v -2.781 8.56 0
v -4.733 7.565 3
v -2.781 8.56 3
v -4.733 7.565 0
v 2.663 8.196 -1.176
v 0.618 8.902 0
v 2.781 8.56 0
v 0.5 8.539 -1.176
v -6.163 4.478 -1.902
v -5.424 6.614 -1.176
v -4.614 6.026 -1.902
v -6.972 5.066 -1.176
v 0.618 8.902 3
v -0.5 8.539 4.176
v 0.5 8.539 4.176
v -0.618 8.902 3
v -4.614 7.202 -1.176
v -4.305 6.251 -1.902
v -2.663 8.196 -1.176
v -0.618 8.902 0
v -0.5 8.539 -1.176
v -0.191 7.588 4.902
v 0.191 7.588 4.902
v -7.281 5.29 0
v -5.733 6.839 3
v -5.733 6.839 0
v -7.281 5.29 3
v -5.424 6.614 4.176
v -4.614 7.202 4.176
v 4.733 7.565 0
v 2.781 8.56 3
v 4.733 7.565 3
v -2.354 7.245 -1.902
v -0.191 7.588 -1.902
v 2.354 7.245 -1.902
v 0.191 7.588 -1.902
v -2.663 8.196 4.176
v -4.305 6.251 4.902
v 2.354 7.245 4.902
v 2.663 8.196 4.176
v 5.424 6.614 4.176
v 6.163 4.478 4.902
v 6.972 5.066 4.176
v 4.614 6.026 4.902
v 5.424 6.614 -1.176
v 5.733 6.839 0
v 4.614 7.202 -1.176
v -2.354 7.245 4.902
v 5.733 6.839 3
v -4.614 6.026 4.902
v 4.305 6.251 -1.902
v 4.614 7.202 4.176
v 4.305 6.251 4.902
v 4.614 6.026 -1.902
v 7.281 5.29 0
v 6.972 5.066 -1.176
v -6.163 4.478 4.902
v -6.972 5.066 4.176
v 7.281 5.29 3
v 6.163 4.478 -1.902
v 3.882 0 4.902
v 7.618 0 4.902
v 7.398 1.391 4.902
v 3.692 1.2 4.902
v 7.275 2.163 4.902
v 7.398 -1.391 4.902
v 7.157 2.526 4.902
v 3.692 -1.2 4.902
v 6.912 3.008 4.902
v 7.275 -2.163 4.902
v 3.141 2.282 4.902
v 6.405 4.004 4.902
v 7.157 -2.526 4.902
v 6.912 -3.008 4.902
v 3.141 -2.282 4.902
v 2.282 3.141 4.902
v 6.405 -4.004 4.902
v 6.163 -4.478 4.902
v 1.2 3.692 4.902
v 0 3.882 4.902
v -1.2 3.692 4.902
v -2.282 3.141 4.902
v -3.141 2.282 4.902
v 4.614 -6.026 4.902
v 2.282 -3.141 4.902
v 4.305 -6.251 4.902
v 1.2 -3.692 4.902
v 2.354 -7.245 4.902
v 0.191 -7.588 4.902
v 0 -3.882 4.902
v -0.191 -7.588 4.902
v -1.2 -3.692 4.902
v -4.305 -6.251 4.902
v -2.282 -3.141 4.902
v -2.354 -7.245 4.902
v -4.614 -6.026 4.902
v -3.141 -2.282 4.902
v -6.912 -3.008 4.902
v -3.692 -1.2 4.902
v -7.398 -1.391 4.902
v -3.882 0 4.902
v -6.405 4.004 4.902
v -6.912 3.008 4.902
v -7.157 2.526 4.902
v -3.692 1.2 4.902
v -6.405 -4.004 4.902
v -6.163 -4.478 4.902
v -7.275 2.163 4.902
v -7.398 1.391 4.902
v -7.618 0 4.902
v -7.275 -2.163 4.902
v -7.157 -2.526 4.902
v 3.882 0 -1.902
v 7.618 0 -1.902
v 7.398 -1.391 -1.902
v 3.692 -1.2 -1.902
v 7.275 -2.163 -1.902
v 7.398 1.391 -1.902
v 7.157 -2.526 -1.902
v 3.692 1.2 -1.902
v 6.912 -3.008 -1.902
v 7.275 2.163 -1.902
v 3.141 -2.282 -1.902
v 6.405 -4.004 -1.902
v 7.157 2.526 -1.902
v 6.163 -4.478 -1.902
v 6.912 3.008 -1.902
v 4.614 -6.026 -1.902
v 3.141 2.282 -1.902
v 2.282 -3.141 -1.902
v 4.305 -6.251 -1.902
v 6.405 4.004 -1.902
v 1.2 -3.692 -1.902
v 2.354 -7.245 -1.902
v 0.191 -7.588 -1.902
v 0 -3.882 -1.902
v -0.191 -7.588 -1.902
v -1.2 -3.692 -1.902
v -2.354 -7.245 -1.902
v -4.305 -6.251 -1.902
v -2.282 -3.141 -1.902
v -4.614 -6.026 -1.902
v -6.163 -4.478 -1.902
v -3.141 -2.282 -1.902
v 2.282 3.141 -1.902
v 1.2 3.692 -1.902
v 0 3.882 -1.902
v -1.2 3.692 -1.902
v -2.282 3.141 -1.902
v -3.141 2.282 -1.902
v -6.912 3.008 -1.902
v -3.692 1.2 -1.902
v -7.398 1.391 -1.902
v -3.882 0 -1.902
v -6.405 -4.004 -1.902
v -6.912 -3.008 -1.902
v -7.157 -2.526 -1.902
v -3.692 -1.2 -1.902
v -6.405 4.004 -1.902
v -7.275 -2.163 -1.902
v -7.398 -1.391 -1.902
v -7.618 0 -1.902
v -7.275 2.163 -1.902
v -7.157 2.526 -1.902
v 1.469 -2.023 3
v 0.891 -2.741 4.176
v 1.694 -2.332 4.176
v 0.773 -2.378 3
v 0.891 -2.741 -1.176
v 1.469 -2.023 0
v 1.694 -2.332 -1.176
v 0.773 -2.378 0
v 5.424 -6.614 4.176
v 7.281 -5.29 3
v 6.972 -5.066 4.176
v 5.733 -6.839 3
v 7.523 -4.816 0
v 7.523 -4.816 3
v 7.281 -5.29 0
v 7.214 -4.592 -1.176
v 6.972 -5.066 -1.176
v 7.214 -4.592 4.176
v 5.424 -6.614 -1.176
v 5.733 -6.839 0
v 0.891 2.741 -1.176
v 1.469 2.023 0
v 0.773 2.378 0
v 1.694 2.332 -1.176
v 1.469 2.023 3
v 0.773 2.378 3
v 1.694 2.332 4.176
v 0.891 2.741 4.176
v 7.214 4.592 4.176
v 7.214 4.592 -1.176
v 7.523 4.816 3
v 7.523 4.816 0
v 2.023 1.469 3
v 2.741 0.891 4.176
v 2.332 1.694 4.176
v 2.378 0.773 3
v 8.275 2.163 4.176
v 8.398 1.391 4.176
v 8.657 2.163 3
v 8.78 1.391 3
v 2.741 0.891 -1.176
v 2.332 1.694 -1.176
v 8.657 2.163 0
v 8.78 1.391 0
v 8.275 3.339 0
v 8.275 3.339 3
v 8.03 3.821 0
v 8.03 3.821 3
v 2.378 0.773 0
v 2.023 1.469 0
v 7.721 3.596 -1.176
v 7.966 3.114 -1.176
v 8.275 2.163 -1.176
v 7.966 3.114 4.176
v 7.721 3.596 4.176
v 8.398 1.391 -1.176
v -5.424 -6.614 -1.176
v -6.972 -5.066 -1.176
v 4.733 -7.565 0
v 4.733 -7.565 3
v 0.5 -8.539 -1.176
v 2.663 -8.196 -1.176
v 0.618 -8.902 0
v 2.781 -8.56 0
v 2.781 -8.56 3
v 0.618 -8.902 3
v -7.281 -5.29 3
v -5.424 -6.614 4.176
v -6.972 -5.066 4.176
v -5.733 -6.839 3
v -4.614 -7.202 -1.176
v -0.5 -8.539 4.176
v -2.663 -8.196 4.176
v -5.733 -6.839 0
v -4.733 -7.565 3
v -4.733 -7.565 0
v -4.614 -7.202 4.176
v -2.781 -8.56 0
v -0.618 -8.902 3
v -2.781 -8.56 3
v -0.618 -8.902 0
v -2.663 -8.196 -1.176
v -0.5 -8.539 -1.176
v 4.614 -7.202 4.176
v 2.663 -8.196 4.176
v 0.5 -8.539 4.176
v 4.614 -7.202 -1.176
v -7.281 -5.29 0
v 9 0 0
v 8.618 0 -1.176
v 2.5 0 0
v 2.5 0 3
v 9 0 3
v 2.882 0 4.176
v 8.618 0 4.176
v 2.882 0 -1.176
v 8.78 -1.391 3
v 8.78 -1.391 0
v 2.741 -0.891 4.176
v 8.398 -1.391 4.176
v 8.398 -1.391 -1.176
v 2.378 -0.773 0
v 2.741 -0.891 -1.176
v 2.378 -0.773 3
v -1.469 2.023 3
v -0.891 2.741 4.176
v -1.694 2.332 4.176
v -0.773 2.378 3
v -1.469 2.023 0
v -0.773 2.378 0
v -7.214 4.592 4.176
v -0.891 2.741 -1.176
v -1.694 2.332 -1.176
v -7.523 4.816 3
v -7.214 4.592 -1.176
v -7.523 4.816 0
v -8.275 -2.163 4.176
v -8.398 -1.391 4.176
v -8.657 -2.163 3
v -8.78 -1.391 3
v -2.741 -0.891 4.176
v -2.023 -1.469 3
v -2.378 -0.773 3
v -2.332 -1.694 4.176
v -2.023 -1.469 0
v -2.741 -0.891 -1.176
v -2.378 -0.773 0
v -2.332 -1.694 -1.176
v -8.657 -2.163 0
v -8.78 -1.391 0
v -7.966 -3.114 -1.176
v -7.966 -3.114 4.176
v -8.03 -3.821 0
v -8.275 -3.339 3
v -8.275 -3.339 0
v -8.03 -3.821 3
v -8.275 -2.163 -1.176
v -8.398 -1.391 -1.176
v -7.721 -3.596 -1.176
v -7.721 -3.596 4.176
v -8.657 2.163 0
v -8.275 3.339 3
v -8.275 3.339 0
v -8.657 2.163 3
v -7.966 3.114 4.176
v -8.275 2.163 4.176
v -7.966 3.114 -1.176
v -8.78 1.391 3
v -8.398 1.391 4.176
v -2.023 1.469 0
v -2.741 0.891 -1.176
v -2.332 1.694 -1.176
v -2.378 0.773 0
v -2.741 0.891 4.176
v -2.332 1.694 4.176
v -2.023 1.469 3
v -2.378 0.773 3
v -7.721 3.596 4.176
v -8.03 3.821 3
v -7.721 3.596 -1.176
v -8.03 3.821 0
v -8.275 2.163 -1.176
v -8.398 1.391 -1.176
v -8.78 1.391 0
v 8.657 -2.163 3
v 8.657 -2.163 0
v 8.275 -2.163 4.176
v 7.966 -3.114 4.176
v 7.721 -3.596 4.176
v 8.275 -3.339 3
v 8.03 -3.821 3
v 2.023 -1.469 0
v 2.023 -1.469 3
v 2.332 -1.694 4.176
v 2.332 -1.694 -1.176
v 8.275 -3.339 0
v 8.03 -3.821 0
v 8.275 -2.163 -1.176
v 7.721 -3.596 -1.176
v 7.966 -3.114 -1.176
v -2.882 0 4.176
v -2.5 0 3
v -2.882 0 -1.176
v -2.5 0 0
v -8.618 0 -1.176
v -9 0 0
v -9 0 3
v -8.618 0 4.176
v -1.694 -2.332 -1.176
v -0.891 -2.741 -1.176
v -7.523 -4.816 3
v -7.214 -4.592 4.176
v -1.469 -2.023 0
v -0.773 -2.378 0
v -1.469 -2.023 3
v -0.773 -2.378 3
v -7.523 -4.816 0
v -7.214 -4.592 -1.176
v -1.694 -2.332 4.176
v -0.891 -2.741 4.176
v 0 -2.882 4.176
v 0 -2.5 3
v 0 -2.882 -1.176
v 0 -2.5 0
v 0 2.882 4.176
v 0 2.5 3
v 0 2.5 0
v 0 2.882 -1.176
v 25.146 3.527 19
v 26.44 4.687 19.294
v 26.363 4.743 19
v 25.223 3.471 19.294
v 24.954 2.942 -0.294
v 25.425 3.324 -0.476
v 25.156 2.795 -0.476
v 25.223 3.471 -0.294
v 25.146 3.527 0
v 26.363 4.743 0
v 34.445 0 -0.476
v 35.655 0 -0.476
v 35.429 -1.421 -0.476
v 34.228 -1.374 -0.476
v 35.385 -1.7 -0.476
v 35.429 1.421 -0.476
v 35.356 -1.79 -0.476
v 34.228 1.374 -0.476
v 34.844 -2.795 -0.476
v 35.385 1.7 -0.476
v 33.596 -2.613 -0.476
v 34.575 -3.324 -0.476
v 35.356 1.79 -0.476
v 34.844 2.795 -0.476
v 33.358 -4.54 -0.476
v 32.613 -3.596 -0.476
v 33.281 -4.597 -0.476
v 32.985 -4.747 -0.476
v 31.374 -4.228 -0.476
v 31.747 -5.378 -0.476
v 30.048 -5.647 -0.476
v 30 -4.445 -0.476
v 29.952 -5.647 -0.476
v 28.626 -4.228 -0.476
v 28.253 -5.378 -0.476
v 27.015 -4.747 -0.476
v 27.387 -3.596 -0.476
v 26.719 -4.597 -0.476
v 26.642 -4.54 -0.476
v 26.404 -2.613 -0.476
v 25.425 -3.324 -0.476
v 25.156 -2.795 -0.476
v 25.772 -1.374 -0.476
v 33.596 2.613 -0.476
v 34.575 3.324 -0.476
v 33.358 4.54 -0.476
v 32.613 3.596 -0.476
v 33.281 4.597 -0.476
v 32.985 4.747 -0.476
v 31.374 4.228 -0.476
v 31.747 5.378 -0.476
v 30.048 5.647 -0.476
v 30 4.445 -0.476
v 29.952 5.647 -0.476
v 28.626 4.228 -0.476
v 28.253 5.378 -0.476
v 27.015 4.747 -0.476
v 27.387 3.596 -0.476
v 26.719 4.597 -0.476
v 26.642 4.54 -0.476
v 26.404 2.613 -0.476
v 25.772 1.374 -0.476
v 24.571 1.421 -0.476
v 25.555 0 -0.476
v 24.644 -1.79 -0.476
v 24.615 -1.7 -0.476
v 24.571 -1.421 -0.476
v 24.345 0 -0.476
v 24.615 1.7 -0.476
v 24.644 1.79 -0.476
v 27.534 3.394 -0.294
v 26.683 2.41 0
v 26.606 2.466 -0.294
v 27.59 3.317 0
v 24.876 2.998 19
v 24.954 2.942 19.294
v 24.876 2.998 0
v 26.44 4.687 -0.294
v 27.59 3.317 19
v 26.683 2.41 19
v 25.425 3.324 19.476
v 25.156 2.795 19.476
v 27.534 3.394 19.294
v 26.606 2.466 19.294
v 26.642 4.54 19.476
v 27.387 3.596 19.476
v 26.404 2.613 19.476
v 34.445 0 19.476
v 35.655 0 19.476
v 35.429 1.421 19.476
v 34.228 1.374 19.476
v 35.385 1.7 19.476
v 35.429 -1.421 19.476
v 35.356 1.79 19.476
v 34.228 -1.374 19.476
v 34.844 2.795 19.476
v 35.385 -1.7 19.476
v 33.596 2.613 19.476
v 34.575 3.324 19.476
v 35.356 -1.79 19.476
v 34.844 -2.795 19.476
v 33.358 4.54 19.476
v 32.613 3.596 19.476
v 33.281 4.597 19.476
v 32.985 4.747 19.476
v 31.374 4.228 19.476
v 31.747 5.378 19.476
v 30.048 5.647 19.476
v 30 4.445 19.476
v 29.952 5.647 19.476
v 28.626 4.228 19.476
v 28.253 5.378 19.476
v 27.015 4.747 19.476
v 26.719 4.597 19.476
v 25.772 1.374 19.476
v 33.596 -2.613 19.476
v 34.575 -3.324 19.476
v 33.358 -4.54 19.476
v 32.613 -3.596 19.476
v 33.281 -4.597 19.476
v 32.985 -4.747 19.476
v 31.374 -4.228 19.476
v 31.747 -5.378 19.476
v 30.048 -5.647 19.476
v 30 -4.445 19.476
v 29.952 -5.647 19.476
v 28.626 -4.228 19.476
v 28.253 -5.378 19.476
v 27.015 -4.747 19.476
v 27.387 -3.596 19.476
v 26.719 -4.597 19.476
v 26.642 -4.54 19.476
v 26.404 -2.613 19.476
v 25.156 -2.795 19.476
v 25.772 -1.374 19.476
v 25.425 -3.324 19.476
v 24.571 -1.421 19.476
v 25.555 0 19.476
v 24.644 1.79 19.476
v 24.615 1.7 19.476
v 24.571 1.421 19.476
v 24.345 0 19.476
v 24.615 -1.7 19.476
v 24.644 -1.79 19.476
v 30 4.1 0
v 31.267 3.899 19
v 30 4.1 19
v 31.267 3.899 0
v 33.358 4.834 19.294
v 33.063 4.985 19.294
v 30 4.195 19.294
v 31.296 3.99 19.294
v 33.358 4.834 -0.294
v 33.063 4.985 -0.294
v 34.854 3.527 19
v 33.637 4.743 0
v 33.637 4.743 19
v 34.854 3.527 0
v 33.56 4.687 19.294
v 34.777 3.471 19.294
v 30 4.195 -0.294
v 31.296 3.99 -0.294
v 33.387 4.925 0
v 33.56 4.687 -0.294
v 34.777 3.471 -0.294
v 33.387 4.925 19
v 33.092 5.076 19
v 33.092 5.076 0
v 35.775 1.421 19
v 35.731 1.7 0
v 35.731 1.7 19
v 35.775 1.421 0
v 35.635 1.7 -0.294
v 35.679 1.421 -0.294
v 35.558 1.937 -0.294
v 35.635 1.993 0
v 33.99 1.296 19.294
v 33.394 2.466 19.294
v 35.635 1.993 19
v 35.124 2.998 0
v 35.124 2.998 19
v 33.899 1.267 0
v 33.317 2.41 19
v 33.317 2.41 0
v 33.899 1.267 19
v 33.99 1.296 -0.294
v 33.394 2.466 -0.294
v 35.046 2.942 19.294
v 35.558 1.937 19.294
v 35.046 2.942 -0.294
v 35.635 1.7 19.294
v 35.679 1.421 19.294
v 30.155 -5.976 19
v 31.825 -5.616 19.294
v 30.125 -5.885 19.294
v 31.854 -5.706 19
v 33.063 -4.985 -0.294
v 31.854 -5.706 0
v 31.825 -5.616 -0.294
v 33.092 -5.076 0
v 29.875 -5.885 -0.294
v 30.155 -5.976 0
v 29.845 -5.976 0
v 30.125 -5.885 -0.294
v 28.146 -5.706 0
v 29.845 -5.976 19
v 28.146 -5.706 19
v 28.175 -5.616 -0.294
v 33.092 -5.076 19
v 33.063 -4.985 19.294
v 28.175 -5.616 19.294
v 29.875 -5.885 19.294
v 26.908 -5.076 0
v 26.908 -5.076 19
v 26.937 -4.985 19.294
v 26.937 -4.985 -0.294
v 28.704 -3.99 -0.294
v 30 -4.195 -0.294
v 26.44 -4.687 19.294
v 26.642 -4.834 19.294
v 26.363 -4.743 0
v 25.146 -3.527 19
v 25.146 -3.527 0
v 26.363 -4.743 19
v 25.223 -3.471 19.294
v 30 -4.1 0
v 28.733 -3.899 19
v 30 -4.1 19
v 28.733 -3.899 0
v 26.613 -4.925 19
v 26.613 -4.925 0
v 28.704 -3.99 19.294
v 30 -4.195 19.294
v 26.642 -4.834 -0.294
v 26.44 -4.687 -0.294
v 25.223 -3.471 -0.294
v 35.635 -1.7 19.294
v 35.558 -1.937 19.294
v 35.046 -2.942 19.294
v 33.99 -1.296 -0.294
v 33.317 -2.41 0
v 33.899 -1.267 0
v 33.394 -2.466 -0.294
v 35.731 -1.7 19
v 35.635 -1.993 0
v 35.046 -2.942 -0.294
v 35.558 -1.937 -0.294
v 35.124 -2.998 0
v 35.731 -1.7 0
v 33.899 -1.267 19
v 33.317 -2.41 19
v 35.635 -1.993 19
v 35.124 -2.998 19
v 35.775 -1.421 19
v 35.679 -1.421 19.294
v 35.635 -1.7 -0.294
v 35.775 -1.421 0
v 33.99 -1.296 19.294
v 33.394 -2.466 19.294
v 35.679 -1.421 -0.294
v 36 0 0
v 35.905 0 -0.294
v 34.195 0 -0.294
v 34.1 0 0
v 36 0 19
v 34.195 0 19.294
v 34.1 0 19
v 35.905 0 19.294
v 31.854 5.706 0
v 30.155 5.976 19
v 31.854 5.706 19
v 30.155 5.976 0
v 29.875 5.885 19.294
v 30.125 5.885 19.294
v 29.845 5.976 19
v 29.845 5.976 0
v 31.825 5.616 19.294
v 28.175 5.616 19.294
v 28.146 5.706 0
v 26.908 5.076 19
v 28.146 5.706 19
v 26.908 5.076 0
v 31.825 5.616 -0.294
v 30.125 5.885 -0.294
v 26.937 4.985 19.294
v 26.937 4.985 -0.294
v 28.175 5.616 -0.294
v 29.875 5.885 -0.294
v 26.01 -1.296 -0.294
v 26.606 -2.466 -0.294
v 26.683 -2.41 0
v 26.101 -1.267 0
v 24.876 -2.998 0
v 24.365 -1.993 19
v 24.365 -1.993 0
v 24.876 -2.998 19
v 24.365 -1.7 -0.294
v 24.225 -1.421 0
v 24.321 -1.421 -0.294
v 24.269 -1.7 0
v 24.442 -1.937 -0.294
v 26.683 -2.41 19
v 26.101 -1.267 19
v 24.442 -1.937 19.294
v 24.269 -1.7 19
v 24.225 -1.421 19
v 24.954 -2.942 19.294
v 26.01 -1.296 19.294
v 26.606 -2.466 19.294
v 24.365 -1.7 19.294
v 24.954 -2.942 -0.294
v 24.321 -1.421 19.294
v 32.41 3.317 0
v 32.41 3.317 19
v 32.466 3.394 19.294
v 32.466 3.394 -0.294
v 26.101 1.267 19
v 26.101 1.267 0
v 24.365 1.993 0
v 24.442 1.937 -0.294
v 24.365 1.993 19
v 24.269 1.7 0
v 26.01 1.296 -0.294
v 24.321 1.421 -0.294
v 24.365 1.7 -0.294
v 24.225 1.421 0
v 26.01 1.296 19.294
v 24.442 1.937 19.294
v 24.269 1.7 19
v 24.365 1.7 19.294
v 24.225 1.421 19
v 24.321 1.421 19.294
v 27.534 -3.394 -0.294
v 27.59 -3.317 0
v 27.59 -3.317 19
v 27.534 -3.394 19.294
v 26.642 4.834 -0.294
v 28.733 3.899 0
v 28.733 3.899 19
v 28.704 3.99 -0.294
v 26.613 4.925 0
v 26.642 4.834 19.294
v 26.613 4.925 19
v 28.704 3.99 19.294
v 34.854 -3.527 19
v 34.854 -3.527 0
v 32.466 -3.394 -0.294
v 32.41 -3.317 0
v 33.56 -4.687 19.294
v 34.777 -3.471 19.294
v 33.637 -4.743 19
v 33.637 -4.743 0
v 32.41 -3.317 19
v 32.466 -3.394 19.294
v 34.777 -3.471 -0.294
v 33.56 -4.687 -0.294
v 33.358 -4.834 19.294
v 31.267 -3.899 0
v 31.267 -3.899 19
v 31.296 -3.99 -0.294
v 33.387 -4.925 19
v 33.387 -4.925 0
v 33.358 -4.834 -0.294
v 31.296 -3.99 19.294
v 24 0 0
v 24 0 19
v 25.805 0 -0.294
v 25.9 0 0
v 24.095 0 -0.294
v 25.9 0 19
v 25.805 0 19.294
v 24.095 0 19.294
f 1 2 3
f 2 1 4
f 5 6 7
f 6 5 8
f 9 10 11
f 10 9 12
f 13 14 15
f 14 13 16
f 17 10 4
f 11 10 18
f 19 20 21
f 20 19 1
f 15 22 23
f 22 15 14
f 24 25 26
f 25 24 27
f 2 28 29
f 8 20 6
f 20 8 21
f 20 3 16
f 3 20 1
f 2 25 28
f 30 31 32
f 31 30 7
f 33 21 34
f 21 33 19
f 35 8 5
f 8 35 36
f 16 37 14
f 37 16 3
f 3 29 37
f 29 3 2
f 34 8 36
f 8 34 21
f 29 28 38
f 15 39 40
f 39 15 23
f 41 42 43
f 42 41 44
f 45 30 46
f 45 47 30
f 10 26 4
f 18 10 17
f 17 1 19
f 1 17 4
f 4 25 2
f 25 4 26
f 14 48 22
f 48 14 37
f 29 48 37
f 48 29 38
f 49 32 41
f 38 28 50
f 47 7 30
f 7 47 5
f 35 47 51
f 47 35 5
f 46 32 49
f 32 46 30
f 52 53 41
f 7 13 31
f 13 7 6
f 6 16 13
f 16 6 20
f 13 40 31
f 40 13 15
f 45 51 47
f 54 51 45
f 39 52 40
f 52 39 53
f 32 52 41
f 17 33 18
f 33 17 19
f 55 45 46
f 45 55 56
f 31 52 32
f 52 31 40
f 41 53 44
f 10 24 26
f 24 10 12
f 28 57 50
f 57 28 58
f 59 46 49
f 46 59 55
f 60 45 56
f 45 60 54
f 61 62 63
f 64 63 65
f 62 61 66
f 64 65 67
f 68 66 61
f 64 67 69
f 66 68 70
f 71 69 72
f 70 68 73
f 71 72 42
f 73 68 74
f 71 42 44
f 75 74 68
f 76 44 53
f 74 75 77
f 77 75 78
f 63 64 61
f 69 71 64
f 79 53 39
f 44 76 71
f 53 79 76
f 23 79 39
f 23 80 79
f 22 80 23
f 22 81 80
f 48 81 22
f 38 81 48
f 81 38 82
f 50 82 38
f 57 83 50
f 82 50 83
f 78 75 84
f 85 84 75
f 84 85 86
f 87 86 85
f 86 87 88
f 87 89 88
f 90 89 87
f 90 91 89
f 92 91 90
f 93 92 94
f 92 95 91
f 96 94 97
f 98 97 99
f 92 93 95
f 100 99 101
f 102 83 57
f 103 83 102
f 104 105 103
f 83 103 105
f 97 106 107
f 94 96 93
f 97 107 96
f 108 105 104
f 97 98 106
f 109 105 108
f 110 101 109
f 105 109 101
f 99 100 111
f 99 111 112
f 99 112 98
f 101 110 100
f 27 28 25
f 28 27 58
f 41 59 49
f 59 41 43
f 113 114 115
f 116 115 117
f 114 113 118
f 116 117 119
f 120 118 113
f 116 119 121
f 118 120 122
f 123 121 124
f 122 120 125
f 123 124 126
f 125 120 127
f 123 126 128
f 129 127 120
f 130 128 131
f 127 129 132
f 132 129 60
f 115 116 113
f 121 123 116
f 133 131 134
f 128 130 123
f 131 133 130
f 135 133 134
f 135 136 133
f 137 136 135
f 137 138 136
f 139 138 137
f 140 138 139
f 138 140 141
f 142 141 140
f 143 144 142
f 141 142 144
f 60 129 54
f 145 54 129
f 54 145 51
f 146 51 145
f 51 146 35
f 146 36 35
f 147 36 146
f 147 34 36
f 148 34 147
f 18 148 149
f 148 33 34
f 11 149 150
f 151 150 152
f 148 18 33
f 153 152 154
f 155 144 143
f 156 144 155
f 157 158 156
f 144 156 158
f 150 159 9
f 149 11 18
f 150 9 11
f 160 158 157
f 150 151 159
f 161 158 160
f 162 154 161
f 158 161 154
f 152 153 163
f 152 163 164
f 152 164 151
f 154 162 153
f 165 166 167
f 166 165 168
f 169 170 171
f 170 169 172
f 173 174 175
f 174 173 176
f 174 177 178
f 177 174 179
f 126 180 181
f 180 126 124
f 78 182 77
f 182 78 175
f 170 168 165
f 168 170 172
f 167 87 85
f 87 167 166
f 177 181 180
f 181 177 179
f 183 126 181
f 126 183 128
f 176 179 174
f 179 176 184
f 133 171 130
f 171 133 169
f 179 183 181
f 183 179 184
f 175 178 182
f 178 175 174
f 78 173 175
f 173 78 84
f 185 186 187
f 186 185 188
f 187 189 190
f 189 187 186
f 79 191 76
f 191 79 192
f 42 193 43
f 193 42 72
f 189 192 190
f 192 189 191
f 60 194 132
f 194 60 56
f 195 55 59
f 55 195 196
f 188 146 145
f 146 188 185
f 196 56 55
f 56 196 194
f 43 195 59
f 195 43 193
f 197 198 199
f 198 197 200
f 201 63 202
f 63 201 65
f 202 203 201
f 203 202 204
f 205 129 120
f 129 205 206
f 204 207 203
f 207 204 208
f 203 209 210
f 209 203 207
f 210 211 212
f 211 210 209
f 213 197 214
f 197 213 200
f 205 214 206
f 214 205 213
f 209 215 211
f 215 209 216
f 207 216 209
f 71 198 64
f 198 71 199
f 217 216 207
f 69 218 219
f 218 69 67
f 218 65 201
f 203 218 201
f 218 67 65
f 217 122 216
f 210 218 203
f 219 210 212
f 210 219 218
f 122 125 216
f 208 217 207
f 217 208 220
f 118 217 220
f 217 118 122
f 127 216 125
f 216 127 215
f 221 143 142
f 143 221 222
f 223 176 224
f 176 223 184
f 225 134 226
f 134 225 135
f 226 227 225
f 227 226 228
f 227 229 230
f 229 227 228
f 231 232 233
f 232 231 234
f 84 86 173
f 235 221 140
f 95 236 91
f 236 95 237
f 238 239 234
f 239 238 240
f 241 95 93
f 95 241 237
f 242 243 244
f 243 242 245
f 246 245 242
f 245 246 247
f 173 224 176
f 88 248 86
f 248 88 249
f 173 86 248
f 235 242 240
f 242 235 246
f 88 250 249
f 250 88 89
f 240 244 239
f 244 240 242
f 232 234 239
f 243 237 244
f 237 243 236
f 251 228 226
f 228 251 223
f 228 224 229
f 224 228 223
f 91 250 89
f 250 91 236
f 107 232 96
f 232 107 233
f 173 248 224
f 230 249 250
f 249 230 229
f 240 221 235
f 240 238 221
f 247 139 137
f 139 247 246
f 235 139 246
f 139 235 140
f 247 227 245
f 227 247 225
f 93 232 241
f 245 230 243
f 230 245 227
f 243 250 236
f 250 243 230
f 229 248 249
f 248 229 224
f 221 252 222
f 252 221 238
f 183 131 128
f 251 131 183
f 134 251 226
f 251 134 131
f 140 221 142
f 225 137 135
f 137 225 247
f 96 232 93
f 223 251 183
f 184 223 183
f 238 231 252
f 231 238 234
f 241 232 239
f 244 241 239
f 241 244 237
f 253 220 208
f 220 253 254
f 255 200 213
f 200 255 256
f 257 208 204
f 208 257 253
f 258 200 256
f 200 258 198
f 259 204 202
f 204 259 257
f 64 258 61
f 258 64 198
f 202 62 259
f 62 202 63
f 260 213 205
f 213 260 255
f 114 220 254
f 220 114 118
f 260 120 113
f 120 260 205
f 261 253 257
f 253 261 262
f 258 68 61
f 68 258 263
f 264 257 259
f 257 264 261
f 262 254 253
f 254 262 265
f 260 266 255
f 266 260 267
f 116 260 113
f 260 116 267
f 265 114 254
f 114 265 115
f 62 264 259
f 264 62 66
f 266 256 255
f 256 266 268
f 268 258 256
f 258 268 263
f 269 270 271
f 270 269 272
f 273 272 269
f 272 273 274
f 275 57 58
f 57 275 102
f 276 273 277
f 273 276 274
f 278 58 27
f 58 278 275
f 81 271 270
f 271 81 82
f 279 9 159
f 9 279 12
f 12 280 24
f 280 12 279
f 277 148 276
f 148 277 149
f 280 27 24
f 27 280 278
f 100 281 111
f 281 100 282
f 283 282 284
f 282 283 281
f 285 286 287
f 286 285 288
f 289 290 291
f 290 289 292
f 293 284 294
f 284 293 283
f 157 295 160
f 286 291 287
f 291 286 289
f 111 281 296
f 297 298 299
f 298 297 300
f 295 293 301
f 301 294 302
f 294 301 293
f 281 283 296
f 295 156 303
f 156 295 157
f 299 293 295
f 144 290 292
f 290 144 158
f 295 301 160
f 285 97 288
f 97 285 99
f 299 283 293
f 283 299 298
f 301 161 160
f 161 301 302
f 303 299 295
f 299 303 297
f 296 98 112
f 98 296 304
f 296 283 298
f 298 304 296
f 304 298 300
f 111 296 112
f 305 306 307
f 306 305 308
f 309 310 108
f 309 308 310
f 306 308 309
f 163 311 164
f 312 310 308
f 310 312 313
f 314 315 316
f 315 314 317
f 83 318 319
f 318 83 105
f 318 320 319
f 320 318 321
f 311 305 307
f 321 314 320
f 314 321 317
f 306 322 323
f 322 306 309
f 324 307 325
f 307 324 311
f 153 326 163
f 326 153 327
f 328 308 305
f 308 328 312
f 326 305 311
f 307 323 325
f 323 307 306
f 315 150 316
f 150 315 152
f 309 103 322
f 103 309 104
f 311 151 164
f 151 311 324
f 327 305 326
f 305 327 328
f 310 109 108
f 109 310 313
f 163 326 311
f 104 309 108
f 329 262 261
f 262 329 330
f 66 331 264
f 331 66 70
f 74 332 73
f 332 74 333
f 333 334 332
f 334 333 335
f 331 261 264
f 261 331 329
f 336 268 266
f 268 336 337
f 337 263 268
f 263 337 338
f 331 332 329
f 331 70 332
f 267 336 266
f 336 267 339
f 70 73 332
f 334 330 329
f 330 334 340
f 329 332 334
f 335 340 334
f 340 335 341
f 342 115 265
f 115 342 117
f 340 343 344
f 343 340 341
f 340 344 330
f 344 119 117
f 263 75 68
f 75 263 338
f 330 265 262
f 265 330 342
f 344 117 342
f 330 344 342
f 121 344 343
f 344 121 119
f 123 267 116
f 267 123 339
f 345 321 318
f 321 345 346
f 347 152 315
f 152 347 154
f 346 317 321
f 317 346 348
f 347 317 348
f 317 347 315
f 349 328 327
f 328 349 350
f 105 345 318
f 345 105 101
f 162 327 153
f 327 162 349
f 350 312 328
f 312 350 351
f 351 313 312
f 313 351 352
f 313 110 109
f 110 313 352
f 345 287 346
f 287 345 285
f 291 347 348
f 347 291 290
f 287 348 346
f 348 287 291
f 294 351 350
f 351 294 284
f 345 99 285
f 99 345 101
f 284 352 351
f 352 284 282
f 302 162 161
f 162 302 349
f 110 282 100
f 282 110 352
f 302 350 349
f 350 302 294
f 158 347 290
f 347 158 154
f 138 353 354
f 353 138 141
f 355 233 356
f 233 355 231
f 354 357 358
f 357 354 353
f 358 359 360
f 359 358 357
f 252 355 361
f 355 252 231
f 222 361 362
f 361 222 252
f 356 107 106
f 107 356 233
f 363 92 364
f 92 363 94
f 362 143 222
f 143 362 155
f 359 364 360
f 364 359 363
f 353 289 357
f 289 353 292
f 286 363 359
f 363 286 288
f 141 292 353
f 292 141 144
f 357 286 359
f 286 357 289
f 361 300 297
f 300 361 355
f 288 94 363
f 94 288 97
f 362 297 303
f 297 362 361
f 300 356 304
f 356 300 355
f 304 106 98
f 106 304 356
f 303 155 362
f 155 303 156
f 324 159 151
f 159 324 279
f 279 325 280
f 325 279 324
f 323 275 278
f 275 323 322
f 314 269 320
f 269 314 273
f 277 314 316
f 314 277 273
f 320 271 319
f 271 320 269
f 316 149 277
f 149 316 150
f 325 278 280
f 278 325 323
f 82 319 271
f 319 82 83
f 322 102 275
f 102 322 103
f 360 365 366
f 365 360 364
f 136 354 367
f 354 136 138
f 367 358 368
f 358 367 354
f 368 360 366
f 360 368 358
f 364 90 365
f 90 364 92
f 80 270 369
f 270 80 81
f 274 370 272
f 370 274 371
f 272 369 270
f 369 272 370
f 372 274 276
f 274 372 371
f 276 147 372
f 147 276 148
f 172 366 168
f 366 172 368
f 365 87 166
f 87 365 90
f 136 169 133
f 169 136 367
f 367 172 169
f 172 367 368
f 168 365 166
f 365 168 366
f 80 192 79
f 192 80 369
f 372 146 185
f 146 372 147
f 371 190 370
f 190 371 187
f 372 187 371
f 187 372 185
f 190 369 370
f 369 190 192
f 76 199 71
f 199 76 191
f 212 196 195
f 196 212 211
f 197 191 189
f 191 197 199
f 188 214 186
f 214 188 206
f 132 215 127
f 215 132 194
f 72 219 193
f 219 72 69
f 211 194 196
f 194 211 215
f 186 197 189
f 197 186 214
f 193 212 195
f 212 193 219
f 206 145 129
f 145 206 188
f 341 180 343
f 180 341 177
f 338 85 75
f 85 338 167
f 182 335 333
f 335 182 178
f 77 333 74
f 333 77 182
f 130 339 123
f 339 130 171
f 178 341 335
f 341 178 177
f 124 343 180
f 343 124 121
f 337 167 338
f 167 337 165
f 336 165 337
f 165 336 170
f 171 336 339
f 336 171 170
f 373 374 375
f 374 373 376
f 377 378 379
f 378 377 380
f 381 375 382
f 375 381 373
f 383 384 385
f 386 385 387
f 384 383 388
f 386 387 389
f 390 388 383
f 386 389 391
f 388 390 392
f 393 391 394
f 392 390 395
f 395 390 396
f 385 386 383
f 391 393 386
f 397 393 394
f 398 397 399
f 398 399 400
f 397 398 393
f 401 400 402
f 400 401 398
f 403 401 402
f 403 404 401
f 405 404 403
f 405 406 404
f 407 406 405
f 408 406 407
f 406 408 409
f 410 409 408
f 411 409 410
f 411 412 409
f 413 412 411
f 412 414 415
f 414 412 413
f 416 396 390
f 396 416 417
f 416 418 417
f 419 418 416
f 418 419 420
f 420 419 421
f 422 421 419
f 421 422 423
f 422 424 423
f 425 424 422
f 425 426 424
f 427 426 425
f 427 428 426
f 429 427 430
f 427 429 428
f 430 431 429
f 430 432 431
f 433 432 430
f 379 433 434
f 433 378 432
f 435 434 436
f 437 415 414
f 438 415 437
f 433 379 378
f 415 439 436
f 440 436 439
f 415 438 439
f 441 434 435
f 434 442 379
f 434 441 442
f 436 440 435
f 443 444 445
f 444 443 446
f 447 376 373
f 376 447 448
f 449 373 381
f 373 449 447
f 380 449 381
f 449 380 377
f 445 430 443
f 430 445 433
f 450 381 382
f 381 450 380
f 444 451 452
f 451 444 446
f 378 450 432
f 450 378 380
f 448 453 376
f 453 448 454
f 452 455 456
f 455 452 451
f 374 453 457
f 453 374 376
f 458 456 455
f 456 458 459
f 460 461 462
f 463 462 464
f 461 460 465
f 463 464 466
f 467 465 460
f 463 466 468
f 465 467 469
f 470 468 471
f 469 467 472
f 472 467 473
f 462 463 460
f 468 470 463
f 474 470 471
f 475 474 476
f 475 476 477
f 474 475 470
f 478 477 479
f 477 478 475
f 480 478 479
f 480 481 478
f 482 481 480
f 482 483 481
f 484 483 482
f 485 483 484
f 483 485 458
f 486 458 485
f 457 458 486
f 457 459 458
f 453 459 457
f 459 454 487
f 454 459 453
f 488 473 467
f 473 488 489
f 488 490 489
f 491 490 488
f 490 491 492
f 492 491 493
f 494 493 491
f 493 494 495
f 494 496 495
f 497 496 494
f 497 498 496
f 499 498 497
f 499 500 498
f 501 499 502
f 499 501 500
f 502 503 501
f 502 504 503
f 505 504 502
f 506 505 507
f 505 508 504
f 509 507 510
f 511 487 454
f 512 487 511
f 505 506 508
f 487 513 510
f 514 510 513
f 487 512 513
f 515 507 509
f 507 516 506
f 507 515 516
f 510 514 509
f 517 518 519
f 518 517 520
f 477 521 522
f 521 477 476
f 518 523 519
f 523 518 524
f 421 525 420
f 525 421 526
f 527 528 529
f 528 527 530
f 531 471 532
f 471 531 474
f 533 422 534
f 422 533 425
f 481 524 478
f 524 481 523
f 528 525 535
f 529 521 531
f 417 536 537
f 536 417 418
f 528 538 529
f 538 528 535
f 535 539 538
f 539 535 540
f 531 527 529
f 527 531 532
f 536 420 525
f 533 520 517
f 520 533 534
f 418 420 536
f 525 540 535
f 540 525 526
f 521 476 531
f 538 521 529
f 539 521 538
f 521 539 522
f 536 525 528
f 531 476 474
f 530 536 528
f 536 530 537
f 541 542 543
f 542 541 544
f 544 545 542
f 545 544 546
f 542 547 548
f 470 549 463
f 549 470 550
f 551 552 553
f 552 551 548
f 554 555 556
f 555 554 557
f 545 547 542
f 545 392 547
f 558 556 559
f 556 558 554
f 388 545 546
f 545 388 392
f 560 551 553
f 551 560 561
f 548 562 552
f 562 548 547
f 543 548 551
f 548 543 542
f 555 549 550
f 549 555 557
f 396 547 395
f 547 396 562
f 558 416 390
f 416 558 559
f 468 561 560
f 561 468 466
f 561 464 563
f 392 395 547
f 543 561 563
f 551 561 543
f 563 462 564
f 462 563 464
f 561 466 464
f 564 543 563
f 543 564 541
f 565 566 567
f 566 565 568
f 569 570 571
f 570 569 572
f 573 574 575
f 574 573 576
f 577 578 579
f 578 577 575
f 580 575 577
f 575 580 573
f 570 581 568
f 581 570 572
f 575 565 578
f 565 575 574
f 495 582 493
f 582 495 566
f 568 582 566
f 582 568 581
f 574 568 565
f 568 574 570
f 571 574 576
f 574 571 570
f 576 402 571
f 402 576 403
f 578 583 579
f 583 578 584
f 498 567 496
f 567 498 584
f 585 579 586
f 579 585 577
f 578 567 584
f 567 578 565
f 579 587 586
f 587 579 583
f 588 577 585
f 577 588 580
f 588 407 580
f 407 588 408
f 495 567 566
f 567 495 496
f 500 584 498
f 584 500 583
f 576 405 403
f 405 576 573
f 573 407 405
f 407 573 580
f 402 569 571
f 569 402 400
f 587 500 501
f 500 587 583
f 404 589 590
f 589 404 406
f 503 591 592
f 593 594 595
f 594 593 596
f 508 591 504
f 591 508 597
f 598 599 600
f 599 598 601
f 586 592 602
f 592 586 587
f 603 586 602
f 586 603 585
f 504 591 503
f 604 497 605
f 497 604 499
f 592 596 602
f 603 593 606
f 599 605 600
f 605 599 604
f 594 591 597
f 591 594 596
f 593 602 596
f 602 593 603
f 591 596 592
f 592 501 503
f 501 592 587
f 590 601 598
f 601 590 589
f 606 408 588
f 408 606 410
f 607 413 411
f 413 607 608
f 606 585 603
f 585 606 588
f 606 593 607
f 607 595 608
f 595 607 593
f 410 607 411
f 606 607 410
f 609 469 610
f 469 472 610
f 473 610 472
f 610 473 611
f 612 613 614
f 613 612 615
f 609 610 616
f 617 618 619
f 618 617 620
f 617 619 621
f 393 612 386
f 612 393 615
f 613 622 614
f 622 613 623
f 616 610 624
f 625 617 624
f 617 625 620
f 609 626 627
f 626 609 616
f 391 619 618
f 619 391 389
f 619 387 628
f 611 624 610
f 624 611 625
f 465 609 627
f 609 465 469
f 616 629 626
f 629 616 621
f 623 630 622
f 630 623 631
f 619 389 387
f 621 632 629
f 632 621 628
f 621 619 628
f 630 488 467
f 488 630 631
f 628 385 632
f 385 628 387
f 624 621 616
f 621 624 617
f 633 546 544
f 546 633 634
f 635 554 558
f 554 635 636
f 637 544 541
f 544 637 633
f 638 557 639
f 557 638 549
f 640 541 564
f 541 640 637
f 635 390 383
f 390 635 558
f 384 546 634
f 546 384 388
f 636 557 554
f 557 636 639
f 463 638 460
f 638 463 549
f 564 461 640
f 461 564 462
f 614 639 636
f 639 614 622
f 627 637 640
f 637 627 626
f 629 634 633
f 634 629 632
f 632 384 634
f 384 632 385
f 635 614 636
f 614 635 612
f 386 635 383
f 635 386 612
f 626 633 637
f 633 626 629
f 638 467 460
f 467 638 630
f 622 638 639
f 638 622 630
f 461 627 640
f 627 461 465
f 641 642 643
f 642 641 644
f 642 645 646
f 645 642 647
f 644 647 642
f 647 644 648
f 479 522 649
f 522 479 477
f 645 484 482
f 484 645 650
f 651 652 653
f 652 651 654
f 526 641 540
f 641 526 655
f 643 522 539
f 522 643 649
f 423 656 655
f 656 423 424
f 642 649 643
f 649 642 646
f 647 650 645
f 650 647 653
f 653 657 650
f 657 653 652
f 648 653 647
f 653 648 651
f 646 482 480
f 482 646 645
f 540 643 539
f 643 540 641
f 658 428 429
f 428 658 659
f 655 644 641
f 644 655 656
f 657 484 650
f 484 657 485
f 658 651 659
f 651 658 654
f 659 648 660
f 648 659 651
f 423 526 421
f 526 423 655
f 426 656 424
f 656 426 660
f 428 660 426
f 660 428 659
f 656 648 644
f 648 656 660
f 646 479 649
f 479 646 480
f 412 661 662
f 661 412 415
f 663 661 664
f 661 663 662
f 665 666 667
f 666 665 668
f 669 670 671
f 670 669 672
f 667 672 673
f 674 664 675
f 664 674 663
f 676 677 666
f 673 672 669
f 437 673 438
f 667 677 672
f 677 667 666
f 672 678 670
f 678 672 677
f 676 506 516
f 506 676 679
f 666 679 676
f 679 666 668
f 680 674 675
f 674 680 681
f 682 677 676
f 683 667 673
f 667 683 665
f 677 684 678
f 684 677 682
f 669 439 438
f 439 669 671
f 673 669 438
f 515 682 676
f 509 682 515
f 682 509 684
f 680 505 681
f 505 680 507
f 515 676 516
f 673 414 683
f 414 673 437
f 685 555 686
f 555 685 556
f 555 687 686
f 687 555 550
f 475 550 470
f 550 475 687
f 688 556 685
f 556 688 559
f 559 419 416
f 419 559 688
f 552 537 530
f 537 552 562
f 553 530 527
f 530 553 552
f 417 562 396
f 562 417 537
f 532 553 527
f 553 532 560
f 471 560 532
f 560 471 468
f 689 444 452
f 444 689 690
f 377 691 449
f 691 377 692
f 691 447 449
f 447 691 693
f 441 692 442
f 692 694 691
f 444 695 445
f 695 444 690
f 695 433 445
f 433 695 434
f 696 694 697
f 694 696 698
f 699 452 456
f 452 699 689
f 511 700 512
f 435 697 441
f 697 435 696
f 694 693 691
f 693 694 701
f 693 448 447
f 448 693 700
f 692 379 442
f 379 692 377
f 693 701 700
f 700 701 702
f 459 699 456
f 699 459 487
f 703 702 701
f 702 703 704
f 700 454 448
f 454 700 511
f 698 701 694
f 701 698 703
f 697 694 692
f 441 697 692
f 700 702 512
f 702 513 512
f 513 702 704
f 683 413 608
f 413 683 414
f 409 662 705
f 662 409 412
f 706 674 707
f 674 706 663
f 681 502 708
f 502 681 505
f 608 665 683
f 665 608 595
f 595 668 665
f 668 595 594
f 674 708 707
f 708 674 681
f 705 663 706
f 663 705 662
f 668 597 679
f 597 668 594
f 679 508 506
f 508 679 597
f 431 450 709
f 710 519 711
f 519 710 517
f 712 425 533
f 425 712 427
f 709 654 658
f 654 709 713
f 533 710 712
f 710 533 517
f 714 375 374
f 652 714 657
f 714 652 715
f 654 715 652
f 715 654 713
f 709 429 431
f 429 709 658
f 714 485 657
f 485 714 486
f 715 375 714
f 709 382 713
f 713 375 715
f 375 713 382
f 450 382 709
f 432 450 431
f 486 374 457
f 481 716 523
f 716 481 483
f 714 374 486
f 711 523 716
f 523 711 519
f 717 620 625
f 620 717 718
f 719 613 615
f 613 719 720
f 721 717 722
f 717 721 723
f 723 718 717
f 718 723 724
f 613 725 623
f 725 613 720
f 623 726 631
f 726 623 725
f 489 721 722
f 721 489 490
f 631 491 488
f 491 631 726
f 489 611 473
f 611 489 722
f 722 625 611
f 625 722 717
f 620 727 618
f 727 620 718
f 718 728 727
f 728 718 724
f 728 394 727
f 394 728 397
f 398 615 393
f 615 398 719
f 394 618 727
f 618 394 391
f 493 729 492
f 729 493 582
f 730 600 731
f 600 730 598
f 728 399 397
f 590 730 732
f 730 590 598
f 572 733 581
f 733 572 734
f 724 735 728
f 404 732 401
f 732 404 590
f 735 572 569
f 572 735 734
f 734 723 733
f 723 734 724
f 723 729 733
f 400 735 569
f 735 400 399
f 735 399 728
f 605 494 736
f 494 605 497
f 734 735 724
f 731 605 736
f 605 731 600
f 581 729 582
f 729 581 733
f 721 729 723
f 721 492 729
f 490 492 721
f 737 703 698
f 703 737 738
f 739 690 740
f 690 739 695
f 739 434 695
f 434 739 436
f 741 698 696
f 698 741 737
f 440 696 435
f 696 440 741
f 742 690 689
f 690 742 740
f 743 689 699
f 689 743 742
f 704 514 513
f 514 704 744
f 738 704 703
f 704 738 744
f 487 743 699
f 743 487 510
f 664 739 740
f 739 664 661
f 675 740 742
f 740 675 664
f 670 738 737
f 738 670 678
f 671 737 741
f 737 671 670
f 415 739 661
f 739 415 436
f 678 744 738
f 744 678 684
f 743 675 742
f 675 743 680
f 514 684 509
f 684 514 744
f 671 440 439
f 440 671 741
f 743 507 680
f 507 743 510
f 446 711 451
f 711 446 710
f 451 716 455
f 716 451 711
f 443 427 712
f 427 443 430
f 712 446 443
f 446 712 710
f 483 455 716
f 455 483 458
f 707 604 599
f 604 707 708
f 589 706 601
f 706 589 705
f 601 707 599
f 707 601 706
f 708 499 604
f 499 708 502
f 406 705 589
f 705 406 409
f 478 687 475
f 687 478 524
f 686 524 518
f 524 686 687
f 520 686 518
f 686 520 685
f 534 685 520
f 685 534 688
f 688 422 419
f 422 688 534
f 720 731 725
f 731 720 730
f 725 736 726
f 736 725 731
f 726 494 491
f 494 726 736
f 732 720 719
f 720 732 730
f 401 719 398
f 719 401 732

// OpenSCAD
// file: ../../../../../../shapes/open-cylinder/open-cylinder.scad
// TODO: Lower this to 50.
module openCylinder(height = 3,
                    outerRadius = 7,
                    innerRadius = 4.5,
                    fn = 100)
{
    $fn = fn;

    difference()
    {
        cylinder(r=outerRadius,
                 h=height);

        translate([0, 0, -1])
        cylinder(r=innerRadius,
                 h=height+1.01);
    }
}
// file: ../../../../../../mounting-hardware/chain-loop/square/chain-loop.scad
/**
 * This is the square variety of chainloop.
 */
module chainLoop(cutoutAxis = "x",
				 xLength = 19,
				 xPercentage = 0.70,
                 yLength = 12,
                 yPercentage = 0.75,
                 zLength = 10,
                 zPercentage = 0.65)
{
    difference()
    {
        color("green")
        cube([xLength, yLength, zLength]);

        cutout(cutoutAxis,
				xLength,
				xPercentage,
				yLength,
				yPercentage,
				zLength,
				zPercentage);
    }
}

/**
 * This module takes the cubic lengths of the chain loop and calculates the
 * dimensions of the cot out protion based on the percentages given.
 *
 * The percentages are expected to be of type float with 1 being 100%.
 */
module cutout(cutoutAxis = "x",
			  xLength = 5,
			  xPercentage = 0.2,
              yLength,
              yPercentage,
              zLength,
              zPercentage)
{
	if(cutoutAxis == "x")
	{
		zCutoutLength = zLength * zPercentage;
	    zTranslate = (zLength/2.0) - (zCutoutLength / 2.0);

	    yCutoutLength = yLength * yPercentage;
	    yTranslate = (yLength / 2.0) - (yCutoutLength / 2.0);

	    translate([-1, yTranslate, zTranslate])
	    cube([xLength+3, yCutoutLength, zCutoutLength]);
	}
	else if(cutoutAxis == "z")
	{
	    yCutoutLength = yLength * yPercentage;
	    yTranslate = (yLength / 2.0) - (yCutoutLength / 2.0);

		xCoutoutLength = xLength * xPercentage;
		xTranslate = (xLength / 2.0) - (xCoutoutLength / 2.0);

		translate([xTranslate, yTranslate, -1])
	    cube([xCoutoutLength, yCutoutLength, zLength+3]);
	}
}
// file: ../../../doughnuts.scad
use <../../../mounting-hardware/chain-loop/square/chain-loop.scad>
use <../../../shapes/open-cylinder/open-cylinder.scad>

module rectangularDoughnut(cornerRadius = 4,
                           sides = 31,
                           yLength = 32,
                           zLength = 35)
{
    $fn=sides;

    minkowski()//size, cornerRadius)
    {
        chainLoop(xLength = 10,
                  yLength = yLength,
                  zLength = zLength,
                  zPercentage=0.64);

      	sphere(r=cornerRadius);
    };
}

module roundDoughnut(fn = 20,
					 height = 3,
					 outerRadius = 7,
					 innerRadius = 4.5,
					 minkowskiSphereRadius = 2)
{
	minkowski()
	{
		openCylinder(height = height,
						outerRadius = outerRadius,
						innerRadius = innerRadius,
						fn = fn);

		sphere(r = minkowskiSphereRadius, $fn = 10);
//        sphere(r = minkowskiSphereRadius);//, $fn = 10);
	}
}
// main file
use <../../../doughnuts.scad>

roundDoughnut();

// skinny tall
xTranslate = 30;
minkowskiSphereRadius = 0.5;
color("orange")
translate([xTranslate, 0, 0])
roundDoughnut(height = 19,
            innerRadius = 4.6,
            outerRadius = 5.5,
            minkowskiSphereRadius = minkowskiSphereRadius);
